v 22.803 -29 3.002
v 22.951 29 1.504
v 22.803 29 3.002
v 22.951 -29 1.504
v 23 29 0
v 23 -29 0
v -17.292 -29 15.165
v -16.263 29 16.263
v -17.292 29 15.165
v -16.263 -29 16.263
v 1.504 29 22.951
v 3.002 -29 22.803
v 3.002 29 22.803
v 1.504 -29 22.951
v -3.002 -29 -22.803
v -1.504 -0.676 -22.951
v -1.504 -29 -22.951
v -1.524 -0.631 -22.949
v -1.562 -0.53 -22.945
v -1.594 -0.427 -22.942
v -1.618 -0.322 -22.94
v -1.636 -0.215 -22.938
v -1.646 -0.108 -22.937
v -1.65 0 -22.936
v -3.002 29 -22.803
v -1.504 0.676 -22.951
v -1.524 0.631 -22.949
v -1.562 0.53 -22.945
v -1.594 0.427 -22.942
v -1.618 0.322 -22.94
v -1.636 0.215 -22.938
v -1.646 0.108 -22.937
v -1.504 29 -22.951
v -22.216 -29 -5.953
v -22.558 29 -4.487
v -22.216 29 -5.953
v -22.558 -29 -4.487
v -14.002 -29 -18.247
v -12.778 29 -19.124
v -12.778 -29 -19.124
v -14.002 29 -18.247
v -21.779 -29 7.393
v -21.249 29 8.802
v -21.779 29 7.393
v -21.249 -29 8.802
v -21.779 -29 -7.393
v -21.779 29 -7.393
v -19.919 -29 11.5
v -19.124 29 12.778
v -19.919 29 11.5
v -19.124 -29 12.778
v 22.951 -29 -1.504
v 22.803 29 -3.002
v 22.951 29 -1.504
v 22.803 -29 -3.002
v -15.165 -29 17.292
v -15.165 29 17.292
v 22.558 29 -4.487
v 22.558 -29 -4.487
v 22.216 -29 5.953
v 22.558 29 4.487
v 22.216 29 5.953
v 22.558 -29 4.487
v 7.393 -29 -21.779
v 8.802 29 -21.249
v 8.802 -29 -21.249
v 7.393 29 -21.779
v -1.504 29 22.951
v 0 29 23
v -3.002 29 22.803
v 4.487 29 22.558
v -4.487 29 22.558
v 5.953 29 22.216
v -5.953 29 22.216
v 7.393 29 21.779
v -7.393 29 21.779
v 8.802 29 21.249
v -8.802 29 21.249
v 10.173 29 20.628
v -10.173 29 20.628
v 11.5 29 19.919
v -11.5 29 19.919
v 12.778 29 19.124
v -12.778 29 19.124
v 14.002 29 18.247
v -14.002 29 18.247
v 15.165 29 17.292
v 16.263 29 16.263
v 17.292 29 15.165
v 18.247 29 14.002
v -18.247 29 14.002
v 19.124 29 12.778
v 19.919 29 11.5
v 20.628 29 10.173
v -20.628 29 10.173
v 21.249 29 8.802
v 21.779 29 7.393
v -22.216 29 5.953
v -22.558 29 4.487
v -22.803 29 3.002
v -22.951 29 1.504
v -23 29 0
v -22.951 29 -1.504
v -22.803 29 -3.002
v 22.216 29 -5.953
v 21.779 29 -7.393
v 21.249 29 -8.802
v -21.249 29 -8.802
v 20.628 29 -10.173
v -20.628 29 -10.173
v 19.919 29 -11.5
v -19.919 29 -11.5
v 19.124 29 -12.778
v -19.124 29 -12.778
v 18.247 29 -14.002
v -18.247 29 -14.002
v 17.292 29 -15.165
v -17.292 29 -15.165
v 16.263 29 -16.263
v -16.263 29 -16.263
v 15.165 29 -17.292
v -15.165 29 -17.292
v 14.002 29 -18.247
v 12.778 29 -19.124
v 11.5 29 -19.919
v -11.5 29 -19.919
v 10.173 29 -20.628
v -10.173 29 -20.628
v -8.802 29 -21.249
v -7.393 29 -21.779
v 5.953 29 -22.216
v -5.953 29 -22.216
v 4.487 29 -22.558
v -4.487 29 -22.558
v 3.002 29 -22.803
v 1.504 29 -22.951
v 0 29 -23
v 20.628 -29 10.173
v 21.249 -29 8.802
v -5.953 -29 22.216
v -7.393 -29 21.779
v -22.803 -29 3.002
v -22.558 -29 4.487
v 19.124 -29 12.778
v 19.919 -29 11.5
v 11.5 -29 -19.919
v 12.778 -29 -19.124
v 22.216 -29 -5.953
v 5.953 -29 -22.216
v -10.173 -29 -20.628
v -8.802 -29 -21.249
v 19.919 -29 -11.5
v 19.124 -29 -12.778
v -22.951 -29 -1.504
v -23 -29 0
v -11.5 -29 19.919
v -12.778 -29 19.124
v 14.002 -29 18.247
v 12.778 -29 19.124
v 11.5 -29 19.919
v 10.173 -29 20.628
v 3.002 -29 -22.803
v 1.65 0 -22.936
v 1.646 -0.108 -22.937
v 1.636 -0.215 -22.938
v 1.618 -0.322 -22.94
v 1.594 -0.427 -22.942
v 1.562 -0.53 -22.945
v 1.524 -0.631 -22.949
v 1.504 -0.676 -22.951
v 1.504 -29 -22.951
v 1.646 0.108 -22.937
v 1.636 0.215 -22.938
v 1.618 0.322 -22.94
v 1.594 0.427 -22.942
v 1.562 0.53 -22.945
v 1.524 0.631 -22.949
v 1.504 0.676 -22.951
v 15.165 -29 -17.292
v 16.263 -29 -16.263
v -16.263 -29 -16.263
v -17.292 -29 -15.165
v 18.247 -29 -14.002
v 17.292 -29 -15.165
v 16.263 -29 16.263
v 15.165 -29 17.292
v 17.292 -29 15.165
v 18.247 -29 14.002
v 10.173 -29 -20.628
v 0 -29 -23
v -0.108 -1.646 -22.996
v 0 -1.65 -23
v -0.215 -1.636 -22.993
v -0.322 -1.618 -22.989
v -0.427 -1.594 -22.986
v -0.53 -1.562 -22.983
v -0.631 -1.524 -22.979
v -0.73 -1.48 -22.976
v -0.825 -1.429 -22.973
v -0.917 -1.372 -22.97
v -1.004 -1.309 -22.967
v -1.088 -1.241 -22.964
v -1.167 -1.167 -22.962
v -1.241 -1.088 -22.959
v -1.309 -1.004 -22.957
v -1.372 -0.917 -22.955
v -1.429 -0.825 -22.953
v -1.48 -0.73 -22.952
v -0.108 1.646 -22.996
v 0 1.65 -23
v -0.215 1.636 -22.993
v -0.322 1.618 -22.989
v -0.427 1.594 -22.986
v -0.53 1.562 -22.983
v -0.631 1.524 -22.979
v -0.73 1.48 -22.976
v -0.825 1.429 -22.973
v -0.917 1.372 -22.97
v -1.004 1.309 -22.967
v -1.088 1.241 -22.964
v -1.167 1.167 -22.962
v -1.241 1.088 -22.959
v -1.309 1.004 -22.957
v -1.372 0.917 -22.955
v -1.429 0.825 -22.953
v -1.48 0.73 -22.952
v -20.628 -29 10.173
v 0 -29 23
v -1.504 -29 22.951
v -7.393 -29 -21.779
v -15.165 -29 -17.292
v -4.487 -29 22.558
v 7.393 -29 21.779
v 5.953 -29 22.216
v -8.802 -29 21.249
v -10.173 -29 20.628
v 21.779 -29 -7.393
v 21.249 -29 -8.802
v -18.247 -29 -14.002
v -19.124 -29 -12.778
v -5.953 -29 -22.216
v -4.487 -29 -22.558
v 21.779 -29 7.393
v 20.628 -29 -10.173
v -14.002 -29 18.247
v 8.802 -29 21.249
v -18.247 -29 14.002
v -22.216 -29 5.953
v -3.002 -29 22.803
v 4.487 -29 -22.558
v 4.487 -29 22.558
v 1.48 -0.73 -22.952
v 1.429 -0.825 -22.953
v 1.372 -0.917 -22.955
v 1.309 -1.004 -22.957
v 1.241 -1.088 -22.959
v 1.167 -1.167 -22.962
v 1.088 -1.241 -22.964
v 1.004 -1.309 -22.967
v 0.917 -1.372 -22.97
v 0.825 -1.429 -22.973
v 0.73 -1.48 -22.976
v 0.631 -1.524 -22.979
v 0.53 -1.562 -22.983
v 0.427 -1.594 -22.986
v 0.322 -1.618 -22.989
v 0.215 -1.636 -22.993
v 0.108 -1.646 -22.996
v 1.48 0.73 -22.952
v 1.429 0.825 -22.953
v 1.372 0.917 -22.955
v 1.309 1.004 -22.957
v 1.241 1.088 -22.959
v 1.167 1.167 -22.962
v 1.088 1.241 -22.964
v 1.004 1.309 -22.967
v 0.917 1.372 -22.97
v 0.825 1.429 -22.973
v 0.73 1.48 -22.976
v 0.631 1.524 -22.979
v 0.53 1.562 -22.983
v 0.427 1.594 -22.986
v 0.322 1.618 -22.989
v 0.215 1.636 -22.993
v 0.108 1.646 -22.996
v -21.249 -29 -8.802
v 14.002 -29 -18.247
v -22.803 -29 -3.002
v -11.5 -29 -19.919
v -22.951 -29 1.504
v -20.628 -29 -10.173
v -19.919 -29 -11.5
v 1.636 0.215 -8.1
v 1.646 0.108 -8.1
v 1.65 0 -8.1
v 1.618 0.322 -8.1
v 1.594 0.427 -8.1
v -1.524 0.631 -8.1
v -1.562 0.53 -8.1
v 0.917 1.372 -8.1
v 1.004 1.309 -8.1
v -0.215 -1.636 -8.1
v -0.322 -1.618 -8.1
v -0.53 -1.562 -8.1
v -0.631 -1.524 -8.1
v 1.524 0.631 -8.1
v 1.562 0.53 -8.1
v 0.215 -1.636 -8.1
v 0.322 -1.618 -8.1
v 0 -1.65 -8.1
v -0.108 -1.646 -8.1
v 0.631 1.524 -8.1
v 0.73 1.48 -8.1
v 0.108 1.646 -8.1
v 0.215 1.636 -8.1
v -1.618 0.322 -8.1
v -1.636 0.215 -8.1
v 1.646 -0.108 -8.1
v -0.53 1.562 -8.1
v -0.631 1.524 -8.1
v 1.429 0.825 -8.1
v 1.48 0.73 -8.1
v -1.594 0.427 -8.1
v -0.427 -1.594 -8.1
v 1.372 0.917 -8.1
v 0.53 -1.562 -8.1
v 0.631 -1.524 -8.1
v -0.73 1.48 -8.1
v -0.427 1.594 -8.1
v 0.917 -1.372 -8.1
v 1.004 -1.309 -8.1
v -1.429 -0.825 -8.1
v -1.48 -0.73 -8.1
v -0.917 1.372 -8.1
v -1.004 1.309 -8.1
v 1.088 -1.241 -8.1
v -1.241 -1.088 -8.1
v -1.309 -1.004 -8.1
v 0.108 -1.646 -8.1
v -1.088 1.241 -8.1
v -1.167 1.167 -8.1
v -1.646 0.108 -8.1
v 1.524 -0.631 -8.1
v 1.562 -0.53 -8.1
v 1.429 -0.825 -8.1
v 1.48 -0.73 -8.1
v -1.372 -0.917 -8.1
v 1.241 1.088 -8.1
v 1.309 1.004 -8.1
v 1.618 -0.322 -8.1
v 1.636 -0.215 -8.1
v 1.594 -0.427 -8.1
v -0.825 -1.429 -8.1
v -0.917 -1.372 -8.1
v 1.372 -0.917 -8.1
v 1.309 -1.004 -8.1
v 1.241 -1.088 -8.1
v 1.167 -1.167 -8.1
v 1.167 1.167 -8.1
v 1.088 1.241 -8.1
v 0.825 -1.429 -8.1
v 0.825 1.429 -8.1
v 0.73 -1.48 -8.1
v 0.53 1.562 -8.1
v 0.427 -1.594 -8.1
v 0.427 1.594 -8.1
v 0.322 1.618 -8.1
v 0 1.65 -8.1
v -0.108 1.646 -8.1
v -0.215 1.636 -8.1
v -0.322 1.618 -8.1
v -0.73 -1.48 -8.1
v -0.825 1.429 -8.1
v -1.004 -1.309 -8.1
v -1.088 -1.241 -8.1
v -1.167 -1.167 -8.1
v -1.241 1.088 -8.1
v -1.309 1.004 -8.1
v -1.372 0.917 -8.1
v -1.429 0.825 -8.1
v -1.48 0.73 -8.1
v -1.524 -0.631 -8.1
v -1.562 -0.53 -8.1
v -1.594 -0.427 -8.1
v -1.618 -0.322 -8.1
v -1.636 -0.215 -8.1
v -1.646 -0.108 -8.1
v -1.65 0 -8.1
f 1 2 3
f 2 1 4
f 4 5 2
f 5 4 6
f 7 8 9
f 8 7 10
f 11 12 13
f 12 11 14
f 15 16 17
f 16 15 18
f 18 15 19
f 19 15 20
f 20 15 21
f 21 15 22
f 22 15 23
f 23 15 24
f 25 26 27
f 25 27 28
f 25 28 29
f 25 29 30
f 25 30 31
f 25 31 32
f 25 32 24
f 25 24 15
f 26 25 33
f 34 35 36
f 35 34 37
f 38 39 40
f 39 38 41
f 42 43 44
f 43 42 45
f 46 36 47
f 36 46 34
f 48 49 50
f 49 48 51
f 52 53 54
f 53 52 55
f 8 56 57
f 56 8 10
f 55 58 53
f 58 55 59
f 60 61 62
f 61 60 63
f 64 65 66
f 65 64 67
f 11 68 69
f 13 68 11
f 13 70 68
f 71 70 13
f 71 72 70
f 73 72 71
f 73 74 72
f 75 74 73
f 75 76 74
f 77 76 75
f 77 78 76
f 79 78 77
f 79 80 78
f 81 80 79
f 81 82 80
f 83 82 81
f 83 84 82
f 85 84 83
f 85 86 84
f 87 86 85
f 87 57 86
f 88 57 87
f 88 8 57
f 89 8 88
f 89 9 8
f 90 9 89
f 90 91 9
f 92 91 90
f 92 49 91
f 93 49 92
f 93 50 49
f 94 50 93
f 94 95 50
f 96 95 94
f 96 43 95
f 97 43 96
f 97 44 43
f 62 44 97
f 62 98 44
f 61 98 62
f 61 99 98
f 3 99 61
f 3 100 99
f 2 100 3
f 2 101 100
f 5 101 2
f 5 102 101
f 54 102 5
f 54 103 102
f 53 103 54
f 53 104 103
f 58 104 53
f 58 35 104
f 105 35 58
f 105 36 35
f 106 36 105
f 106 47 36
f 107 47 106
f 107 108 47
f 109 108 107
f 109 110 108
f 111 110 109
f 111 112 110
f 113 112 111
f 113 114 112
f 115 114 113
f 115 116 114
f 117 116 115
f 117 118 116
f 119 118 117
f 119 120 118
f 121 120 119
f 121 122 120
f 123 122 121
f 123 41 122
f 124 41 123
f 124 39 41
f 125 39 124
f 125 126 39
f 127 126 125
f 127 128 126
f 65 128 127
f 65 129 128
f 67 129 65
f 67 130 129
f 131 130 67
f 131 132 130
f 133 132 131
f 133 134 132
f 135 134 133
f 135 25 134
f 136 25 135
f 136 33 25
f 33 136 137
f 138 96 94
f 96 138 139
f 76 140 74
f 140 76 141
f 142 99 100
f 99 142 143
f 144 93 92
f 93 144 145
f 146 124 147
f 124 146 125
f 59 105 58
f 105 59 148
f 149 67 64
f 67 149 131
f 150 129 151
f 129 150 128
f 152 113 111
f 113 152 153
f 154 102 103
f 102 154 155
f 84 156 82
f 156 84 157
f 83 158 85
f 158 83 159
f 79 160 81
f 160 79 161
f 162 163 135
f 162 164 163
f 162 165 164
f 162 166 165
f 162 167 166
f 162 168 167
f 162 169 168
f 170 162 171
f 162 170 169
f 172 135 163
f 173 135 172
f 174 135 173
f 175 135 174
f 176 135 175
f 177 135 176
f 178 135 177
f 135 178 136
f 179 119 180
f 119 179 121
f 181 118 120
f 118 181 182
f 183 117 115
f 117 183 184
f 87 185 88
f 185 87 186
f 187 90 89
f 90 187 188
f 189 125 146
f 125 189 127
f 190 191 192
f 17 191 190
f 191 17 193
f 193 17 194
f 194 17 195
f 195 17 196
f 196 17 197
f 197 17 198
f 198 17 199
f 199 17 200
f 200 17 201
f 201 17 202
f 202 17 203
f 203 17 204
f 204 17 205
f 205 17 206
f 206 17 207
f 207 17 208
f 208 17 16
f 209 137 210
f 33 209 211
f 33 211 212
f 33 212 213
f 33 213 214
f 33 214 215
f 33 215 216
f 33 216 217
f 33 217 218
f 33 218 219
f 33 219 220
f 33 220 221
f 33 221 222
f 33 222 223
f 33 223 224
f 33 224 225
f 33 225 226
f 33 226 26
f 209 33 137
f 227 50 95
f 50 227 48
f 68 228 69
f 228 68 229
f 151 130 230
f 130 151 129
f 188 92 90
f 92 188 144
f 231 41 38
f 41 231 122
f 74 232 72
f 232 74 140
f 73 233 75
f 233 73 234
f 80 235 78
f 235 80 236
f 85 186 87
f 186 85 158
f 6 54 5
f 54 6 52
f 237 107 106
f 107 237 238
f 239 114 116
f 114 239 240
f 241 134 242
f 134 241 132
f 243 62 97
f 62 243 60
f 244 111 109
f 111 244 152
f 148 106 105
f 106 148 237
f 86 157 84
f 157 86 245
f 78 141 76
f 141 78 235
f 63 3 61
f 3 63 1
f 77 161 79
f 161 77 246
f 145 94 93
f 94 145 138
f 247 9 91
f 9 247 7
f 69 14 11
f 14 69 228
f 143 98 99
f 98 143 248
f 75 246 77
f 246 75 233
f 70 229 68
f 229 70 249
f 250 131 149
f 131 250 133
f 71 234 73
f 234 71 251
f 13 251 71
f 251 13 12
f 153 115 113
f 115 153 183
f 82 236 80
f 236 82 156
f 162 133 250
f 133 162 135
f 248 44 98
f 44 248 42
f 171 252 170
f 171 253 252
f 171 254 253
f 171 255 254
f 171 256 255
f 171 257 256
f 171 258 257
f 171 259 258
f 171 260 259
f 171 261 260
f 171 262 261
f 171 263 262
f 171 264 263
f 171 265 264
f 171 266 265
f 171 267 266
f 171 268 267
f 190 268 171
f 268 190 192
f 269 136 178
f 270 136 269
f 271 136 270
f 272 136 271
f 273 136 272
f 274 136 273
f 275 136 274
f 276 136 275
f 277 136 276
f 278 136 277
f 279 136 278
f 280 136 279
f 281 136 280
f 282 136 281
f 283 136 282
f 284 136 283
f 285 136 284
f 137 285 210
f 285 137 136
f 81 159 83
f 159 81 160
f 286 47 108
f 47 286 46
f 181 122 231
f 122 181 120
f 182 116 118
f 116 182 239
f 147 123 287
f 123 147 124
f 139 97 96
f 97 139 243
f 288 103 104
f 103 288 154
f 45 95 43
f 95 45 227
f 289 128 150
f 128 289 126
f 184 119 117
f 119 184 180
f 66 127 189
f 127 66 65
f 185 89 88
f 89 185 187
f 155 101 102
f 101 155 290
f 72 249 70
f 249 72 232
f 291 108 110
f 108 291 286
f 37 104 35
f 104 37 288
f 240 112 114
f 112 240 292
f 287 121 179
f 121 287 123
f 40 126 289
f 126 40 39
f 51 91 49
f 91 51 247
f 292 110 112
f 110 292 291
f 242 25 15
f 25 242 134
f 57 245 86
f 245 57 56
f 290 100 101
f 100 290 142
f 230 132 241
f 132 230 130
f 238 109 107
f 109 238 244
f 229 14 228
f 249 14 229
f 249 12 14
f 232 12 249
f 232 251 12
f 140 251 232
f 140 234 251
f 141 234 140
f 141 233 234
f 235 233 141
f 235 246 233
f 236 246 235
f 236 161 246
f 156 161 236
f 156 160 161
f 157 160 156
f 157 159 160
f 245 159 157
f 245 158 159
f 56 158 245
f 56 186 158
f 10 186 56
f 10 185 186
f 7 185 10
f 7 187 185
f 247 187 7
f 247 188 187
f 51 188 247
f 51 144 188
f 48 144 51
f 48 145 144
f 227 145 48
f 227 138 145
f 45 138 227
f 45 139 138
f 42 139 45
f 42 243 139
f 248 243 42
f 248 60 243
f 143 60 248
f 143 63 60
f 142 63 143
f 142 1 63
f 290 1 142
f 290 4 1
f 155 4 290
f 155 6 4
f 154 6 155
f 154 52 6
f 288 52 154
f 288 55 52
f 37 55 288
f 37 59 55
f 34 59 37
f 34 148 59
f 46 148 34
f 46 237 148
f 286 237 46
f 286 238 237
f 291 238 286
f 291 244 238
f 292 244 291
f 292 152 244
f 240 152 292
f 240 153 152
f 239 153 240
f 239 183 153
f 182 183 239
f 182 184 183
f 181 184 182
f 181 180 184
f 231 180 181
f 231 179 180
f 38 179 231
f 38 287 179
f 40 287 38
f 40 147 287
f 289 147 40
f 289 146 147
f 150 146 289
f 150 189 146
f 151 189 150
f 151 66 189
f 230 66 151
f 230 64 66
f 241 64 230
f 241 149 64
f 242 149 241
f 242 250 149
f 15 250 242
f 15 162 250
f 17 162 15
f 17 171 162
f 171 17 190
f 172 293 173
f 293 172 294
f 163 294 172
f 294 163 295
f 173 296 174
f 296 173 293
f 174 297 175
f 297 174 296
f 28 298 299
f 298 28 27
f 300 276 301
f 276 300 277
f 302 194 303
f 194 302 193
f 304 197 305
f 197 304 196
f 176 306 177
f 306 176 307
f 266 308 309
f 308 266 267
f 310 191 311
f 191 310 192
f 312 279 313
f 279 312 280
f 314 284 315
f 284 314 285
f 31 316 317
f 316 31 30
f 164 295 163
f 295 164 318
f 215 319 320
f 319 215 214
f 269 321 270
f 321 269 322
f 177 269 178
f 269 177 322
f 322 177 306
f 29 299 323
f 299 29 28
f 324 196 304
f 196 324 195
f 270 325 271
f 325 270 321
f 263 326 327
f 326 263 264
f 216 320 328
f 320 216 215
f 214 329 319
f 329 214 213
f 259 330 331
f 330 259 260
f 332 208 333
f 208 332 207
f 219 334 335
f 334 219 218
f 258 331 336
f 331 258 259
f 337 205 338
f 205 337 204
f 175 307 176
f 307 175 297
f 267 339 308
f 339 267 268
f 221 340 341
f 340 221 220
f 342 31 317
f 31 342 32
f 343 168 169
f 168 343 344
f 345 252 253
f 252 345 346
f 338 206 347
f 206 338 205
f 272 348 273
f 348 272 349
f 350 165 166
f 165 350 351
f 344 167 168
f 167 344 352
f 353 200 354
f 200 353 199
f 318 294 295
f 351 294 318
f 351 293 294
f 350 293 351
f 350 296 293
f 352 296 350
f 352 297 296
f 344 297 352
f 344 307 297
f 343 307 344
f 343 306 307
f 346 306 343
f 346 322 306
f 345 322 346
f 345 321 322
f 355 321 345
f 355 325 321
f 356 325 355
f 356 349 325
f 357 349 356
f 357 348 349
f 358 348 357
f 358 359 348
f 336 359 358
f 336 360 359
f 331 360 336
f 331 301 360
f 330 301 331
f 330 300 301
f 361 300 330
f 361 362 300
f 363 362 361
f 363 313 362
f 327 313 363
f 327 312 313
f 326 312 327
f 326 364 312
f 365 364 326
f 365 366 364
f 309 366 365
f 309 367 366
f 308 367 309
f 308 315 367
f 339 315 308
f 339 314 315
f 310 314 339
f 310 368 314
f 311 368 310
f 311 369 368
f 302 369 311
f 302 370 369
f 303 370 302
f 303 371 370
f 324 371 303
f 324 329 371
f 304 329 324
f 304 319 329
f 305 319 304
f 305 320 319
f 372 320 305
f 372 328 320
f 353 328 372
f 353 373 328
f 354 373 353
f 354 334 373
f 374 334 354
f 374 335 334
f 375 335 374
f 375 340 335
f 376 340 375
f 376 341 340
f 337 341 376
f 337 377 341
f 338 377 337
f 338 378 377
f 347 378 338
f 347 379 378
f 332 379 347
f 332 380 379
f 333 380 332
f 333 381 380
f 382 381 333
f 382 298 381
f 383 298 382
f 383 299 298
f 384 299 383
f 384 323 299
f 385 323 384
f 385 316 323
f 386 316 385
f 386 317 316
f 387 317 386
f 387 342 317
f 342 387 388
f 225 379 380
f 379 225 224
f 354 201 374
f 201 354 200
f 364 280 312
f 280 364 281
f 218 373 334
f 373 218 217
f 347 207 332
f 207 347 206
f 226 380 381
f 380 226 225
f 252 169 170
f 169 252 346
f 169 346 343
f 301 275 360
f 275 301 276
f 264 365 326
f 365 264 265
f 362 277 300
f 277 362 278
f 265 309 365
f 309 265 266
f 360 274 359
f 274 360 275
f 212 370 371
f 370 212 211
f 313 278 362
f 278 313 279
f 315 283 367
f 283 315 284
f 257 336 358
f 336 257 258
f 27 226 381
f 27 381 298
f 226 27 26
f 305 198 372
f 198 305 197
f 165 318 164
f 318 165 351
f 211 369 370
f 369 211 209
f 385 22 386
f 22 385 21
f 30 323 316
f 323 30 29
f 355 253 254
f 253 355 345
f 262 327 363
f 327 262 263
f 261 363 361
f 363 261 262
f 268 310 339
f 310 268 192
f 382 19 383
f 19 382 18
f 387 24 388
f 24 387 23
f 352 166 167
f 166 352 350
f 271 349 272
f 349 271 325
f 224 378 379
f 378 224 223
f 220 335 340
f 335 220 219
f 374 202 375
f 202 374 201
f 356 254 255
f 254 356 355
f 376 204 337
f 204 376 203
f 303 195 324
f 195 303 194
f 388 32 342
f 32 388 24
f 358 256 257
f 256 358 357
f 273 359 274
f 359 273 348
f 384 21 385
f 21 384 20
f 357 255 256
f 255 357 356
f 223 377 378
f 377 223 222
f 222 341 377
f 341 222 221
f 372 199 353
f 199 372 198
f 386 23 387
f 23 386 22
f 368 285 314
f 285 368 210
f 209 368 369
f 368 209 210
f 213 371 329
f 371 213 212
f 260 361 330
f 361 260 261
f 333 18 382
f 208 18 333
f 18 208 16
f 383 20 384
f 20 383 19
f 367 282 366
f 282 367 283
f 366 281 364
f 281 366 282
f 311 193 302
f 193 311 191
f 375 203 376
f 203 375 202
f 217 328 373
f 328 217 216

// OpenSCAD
// Millimetres. Export each part individually with openscad -D 'part="scale"' ...
// Orange instrument only. The blue sleeve and yellow glove mount to the fixed shelf.
// The rigid crown core accepts a 2 mm compliant sleeve to give 50 mm finished OD.
// Tap the pilot with M4 tooling after manufacture. Tolerances depend on process.
part = "core";
$fn=96;
module core(){
    difference(){
        rotate([90,0,0]) cylinder(d=46,h=58,center=true);
        translate([0,0,-23.1]) cylinder(d=3.3,h=15);
    }
}
module scale(){
    // Scale carries eight white tick inserts, 5 mm apart; zero at Z=44.
    difference(){
        cube([3,41,60]);
        for(i=[0:7])
            translate([-.25,4,44-i*5]) cube([1.25,i%2==0 ? 33:20,1.5]);
        for(z=[4,55]) translate([-.5,20.5,z]) rotate([0,90,0]) cylinder(d=3.4,h=4);
    }
}
module pointer(){
    difference(){
        union(){
            cube([3,33,3]);
            translate([0,-8,-2]) cube([3,10,7]);
        }
        translate([-.2,-4,1.5]) rotate([0,90,0]) cylinder(d=3.2,h=3.5);
    }
}
module handle(){
    difference(){
        union(){
            cube([19,37,72]);
            translate([-8,0,0]) cube([35,37,6]);
        }
        for(x=[-4,23],y=[6,31]) translate([x,y,-1]) cylinder(d=4.5,h=8);
    }
}
if(part=="core")core();
else if(part=="scale")scale();
else if(part=="pointer")pointer();
else if(part=="handle")handle();
else assert(false,"part must be core, scale, pointer, or handle");
